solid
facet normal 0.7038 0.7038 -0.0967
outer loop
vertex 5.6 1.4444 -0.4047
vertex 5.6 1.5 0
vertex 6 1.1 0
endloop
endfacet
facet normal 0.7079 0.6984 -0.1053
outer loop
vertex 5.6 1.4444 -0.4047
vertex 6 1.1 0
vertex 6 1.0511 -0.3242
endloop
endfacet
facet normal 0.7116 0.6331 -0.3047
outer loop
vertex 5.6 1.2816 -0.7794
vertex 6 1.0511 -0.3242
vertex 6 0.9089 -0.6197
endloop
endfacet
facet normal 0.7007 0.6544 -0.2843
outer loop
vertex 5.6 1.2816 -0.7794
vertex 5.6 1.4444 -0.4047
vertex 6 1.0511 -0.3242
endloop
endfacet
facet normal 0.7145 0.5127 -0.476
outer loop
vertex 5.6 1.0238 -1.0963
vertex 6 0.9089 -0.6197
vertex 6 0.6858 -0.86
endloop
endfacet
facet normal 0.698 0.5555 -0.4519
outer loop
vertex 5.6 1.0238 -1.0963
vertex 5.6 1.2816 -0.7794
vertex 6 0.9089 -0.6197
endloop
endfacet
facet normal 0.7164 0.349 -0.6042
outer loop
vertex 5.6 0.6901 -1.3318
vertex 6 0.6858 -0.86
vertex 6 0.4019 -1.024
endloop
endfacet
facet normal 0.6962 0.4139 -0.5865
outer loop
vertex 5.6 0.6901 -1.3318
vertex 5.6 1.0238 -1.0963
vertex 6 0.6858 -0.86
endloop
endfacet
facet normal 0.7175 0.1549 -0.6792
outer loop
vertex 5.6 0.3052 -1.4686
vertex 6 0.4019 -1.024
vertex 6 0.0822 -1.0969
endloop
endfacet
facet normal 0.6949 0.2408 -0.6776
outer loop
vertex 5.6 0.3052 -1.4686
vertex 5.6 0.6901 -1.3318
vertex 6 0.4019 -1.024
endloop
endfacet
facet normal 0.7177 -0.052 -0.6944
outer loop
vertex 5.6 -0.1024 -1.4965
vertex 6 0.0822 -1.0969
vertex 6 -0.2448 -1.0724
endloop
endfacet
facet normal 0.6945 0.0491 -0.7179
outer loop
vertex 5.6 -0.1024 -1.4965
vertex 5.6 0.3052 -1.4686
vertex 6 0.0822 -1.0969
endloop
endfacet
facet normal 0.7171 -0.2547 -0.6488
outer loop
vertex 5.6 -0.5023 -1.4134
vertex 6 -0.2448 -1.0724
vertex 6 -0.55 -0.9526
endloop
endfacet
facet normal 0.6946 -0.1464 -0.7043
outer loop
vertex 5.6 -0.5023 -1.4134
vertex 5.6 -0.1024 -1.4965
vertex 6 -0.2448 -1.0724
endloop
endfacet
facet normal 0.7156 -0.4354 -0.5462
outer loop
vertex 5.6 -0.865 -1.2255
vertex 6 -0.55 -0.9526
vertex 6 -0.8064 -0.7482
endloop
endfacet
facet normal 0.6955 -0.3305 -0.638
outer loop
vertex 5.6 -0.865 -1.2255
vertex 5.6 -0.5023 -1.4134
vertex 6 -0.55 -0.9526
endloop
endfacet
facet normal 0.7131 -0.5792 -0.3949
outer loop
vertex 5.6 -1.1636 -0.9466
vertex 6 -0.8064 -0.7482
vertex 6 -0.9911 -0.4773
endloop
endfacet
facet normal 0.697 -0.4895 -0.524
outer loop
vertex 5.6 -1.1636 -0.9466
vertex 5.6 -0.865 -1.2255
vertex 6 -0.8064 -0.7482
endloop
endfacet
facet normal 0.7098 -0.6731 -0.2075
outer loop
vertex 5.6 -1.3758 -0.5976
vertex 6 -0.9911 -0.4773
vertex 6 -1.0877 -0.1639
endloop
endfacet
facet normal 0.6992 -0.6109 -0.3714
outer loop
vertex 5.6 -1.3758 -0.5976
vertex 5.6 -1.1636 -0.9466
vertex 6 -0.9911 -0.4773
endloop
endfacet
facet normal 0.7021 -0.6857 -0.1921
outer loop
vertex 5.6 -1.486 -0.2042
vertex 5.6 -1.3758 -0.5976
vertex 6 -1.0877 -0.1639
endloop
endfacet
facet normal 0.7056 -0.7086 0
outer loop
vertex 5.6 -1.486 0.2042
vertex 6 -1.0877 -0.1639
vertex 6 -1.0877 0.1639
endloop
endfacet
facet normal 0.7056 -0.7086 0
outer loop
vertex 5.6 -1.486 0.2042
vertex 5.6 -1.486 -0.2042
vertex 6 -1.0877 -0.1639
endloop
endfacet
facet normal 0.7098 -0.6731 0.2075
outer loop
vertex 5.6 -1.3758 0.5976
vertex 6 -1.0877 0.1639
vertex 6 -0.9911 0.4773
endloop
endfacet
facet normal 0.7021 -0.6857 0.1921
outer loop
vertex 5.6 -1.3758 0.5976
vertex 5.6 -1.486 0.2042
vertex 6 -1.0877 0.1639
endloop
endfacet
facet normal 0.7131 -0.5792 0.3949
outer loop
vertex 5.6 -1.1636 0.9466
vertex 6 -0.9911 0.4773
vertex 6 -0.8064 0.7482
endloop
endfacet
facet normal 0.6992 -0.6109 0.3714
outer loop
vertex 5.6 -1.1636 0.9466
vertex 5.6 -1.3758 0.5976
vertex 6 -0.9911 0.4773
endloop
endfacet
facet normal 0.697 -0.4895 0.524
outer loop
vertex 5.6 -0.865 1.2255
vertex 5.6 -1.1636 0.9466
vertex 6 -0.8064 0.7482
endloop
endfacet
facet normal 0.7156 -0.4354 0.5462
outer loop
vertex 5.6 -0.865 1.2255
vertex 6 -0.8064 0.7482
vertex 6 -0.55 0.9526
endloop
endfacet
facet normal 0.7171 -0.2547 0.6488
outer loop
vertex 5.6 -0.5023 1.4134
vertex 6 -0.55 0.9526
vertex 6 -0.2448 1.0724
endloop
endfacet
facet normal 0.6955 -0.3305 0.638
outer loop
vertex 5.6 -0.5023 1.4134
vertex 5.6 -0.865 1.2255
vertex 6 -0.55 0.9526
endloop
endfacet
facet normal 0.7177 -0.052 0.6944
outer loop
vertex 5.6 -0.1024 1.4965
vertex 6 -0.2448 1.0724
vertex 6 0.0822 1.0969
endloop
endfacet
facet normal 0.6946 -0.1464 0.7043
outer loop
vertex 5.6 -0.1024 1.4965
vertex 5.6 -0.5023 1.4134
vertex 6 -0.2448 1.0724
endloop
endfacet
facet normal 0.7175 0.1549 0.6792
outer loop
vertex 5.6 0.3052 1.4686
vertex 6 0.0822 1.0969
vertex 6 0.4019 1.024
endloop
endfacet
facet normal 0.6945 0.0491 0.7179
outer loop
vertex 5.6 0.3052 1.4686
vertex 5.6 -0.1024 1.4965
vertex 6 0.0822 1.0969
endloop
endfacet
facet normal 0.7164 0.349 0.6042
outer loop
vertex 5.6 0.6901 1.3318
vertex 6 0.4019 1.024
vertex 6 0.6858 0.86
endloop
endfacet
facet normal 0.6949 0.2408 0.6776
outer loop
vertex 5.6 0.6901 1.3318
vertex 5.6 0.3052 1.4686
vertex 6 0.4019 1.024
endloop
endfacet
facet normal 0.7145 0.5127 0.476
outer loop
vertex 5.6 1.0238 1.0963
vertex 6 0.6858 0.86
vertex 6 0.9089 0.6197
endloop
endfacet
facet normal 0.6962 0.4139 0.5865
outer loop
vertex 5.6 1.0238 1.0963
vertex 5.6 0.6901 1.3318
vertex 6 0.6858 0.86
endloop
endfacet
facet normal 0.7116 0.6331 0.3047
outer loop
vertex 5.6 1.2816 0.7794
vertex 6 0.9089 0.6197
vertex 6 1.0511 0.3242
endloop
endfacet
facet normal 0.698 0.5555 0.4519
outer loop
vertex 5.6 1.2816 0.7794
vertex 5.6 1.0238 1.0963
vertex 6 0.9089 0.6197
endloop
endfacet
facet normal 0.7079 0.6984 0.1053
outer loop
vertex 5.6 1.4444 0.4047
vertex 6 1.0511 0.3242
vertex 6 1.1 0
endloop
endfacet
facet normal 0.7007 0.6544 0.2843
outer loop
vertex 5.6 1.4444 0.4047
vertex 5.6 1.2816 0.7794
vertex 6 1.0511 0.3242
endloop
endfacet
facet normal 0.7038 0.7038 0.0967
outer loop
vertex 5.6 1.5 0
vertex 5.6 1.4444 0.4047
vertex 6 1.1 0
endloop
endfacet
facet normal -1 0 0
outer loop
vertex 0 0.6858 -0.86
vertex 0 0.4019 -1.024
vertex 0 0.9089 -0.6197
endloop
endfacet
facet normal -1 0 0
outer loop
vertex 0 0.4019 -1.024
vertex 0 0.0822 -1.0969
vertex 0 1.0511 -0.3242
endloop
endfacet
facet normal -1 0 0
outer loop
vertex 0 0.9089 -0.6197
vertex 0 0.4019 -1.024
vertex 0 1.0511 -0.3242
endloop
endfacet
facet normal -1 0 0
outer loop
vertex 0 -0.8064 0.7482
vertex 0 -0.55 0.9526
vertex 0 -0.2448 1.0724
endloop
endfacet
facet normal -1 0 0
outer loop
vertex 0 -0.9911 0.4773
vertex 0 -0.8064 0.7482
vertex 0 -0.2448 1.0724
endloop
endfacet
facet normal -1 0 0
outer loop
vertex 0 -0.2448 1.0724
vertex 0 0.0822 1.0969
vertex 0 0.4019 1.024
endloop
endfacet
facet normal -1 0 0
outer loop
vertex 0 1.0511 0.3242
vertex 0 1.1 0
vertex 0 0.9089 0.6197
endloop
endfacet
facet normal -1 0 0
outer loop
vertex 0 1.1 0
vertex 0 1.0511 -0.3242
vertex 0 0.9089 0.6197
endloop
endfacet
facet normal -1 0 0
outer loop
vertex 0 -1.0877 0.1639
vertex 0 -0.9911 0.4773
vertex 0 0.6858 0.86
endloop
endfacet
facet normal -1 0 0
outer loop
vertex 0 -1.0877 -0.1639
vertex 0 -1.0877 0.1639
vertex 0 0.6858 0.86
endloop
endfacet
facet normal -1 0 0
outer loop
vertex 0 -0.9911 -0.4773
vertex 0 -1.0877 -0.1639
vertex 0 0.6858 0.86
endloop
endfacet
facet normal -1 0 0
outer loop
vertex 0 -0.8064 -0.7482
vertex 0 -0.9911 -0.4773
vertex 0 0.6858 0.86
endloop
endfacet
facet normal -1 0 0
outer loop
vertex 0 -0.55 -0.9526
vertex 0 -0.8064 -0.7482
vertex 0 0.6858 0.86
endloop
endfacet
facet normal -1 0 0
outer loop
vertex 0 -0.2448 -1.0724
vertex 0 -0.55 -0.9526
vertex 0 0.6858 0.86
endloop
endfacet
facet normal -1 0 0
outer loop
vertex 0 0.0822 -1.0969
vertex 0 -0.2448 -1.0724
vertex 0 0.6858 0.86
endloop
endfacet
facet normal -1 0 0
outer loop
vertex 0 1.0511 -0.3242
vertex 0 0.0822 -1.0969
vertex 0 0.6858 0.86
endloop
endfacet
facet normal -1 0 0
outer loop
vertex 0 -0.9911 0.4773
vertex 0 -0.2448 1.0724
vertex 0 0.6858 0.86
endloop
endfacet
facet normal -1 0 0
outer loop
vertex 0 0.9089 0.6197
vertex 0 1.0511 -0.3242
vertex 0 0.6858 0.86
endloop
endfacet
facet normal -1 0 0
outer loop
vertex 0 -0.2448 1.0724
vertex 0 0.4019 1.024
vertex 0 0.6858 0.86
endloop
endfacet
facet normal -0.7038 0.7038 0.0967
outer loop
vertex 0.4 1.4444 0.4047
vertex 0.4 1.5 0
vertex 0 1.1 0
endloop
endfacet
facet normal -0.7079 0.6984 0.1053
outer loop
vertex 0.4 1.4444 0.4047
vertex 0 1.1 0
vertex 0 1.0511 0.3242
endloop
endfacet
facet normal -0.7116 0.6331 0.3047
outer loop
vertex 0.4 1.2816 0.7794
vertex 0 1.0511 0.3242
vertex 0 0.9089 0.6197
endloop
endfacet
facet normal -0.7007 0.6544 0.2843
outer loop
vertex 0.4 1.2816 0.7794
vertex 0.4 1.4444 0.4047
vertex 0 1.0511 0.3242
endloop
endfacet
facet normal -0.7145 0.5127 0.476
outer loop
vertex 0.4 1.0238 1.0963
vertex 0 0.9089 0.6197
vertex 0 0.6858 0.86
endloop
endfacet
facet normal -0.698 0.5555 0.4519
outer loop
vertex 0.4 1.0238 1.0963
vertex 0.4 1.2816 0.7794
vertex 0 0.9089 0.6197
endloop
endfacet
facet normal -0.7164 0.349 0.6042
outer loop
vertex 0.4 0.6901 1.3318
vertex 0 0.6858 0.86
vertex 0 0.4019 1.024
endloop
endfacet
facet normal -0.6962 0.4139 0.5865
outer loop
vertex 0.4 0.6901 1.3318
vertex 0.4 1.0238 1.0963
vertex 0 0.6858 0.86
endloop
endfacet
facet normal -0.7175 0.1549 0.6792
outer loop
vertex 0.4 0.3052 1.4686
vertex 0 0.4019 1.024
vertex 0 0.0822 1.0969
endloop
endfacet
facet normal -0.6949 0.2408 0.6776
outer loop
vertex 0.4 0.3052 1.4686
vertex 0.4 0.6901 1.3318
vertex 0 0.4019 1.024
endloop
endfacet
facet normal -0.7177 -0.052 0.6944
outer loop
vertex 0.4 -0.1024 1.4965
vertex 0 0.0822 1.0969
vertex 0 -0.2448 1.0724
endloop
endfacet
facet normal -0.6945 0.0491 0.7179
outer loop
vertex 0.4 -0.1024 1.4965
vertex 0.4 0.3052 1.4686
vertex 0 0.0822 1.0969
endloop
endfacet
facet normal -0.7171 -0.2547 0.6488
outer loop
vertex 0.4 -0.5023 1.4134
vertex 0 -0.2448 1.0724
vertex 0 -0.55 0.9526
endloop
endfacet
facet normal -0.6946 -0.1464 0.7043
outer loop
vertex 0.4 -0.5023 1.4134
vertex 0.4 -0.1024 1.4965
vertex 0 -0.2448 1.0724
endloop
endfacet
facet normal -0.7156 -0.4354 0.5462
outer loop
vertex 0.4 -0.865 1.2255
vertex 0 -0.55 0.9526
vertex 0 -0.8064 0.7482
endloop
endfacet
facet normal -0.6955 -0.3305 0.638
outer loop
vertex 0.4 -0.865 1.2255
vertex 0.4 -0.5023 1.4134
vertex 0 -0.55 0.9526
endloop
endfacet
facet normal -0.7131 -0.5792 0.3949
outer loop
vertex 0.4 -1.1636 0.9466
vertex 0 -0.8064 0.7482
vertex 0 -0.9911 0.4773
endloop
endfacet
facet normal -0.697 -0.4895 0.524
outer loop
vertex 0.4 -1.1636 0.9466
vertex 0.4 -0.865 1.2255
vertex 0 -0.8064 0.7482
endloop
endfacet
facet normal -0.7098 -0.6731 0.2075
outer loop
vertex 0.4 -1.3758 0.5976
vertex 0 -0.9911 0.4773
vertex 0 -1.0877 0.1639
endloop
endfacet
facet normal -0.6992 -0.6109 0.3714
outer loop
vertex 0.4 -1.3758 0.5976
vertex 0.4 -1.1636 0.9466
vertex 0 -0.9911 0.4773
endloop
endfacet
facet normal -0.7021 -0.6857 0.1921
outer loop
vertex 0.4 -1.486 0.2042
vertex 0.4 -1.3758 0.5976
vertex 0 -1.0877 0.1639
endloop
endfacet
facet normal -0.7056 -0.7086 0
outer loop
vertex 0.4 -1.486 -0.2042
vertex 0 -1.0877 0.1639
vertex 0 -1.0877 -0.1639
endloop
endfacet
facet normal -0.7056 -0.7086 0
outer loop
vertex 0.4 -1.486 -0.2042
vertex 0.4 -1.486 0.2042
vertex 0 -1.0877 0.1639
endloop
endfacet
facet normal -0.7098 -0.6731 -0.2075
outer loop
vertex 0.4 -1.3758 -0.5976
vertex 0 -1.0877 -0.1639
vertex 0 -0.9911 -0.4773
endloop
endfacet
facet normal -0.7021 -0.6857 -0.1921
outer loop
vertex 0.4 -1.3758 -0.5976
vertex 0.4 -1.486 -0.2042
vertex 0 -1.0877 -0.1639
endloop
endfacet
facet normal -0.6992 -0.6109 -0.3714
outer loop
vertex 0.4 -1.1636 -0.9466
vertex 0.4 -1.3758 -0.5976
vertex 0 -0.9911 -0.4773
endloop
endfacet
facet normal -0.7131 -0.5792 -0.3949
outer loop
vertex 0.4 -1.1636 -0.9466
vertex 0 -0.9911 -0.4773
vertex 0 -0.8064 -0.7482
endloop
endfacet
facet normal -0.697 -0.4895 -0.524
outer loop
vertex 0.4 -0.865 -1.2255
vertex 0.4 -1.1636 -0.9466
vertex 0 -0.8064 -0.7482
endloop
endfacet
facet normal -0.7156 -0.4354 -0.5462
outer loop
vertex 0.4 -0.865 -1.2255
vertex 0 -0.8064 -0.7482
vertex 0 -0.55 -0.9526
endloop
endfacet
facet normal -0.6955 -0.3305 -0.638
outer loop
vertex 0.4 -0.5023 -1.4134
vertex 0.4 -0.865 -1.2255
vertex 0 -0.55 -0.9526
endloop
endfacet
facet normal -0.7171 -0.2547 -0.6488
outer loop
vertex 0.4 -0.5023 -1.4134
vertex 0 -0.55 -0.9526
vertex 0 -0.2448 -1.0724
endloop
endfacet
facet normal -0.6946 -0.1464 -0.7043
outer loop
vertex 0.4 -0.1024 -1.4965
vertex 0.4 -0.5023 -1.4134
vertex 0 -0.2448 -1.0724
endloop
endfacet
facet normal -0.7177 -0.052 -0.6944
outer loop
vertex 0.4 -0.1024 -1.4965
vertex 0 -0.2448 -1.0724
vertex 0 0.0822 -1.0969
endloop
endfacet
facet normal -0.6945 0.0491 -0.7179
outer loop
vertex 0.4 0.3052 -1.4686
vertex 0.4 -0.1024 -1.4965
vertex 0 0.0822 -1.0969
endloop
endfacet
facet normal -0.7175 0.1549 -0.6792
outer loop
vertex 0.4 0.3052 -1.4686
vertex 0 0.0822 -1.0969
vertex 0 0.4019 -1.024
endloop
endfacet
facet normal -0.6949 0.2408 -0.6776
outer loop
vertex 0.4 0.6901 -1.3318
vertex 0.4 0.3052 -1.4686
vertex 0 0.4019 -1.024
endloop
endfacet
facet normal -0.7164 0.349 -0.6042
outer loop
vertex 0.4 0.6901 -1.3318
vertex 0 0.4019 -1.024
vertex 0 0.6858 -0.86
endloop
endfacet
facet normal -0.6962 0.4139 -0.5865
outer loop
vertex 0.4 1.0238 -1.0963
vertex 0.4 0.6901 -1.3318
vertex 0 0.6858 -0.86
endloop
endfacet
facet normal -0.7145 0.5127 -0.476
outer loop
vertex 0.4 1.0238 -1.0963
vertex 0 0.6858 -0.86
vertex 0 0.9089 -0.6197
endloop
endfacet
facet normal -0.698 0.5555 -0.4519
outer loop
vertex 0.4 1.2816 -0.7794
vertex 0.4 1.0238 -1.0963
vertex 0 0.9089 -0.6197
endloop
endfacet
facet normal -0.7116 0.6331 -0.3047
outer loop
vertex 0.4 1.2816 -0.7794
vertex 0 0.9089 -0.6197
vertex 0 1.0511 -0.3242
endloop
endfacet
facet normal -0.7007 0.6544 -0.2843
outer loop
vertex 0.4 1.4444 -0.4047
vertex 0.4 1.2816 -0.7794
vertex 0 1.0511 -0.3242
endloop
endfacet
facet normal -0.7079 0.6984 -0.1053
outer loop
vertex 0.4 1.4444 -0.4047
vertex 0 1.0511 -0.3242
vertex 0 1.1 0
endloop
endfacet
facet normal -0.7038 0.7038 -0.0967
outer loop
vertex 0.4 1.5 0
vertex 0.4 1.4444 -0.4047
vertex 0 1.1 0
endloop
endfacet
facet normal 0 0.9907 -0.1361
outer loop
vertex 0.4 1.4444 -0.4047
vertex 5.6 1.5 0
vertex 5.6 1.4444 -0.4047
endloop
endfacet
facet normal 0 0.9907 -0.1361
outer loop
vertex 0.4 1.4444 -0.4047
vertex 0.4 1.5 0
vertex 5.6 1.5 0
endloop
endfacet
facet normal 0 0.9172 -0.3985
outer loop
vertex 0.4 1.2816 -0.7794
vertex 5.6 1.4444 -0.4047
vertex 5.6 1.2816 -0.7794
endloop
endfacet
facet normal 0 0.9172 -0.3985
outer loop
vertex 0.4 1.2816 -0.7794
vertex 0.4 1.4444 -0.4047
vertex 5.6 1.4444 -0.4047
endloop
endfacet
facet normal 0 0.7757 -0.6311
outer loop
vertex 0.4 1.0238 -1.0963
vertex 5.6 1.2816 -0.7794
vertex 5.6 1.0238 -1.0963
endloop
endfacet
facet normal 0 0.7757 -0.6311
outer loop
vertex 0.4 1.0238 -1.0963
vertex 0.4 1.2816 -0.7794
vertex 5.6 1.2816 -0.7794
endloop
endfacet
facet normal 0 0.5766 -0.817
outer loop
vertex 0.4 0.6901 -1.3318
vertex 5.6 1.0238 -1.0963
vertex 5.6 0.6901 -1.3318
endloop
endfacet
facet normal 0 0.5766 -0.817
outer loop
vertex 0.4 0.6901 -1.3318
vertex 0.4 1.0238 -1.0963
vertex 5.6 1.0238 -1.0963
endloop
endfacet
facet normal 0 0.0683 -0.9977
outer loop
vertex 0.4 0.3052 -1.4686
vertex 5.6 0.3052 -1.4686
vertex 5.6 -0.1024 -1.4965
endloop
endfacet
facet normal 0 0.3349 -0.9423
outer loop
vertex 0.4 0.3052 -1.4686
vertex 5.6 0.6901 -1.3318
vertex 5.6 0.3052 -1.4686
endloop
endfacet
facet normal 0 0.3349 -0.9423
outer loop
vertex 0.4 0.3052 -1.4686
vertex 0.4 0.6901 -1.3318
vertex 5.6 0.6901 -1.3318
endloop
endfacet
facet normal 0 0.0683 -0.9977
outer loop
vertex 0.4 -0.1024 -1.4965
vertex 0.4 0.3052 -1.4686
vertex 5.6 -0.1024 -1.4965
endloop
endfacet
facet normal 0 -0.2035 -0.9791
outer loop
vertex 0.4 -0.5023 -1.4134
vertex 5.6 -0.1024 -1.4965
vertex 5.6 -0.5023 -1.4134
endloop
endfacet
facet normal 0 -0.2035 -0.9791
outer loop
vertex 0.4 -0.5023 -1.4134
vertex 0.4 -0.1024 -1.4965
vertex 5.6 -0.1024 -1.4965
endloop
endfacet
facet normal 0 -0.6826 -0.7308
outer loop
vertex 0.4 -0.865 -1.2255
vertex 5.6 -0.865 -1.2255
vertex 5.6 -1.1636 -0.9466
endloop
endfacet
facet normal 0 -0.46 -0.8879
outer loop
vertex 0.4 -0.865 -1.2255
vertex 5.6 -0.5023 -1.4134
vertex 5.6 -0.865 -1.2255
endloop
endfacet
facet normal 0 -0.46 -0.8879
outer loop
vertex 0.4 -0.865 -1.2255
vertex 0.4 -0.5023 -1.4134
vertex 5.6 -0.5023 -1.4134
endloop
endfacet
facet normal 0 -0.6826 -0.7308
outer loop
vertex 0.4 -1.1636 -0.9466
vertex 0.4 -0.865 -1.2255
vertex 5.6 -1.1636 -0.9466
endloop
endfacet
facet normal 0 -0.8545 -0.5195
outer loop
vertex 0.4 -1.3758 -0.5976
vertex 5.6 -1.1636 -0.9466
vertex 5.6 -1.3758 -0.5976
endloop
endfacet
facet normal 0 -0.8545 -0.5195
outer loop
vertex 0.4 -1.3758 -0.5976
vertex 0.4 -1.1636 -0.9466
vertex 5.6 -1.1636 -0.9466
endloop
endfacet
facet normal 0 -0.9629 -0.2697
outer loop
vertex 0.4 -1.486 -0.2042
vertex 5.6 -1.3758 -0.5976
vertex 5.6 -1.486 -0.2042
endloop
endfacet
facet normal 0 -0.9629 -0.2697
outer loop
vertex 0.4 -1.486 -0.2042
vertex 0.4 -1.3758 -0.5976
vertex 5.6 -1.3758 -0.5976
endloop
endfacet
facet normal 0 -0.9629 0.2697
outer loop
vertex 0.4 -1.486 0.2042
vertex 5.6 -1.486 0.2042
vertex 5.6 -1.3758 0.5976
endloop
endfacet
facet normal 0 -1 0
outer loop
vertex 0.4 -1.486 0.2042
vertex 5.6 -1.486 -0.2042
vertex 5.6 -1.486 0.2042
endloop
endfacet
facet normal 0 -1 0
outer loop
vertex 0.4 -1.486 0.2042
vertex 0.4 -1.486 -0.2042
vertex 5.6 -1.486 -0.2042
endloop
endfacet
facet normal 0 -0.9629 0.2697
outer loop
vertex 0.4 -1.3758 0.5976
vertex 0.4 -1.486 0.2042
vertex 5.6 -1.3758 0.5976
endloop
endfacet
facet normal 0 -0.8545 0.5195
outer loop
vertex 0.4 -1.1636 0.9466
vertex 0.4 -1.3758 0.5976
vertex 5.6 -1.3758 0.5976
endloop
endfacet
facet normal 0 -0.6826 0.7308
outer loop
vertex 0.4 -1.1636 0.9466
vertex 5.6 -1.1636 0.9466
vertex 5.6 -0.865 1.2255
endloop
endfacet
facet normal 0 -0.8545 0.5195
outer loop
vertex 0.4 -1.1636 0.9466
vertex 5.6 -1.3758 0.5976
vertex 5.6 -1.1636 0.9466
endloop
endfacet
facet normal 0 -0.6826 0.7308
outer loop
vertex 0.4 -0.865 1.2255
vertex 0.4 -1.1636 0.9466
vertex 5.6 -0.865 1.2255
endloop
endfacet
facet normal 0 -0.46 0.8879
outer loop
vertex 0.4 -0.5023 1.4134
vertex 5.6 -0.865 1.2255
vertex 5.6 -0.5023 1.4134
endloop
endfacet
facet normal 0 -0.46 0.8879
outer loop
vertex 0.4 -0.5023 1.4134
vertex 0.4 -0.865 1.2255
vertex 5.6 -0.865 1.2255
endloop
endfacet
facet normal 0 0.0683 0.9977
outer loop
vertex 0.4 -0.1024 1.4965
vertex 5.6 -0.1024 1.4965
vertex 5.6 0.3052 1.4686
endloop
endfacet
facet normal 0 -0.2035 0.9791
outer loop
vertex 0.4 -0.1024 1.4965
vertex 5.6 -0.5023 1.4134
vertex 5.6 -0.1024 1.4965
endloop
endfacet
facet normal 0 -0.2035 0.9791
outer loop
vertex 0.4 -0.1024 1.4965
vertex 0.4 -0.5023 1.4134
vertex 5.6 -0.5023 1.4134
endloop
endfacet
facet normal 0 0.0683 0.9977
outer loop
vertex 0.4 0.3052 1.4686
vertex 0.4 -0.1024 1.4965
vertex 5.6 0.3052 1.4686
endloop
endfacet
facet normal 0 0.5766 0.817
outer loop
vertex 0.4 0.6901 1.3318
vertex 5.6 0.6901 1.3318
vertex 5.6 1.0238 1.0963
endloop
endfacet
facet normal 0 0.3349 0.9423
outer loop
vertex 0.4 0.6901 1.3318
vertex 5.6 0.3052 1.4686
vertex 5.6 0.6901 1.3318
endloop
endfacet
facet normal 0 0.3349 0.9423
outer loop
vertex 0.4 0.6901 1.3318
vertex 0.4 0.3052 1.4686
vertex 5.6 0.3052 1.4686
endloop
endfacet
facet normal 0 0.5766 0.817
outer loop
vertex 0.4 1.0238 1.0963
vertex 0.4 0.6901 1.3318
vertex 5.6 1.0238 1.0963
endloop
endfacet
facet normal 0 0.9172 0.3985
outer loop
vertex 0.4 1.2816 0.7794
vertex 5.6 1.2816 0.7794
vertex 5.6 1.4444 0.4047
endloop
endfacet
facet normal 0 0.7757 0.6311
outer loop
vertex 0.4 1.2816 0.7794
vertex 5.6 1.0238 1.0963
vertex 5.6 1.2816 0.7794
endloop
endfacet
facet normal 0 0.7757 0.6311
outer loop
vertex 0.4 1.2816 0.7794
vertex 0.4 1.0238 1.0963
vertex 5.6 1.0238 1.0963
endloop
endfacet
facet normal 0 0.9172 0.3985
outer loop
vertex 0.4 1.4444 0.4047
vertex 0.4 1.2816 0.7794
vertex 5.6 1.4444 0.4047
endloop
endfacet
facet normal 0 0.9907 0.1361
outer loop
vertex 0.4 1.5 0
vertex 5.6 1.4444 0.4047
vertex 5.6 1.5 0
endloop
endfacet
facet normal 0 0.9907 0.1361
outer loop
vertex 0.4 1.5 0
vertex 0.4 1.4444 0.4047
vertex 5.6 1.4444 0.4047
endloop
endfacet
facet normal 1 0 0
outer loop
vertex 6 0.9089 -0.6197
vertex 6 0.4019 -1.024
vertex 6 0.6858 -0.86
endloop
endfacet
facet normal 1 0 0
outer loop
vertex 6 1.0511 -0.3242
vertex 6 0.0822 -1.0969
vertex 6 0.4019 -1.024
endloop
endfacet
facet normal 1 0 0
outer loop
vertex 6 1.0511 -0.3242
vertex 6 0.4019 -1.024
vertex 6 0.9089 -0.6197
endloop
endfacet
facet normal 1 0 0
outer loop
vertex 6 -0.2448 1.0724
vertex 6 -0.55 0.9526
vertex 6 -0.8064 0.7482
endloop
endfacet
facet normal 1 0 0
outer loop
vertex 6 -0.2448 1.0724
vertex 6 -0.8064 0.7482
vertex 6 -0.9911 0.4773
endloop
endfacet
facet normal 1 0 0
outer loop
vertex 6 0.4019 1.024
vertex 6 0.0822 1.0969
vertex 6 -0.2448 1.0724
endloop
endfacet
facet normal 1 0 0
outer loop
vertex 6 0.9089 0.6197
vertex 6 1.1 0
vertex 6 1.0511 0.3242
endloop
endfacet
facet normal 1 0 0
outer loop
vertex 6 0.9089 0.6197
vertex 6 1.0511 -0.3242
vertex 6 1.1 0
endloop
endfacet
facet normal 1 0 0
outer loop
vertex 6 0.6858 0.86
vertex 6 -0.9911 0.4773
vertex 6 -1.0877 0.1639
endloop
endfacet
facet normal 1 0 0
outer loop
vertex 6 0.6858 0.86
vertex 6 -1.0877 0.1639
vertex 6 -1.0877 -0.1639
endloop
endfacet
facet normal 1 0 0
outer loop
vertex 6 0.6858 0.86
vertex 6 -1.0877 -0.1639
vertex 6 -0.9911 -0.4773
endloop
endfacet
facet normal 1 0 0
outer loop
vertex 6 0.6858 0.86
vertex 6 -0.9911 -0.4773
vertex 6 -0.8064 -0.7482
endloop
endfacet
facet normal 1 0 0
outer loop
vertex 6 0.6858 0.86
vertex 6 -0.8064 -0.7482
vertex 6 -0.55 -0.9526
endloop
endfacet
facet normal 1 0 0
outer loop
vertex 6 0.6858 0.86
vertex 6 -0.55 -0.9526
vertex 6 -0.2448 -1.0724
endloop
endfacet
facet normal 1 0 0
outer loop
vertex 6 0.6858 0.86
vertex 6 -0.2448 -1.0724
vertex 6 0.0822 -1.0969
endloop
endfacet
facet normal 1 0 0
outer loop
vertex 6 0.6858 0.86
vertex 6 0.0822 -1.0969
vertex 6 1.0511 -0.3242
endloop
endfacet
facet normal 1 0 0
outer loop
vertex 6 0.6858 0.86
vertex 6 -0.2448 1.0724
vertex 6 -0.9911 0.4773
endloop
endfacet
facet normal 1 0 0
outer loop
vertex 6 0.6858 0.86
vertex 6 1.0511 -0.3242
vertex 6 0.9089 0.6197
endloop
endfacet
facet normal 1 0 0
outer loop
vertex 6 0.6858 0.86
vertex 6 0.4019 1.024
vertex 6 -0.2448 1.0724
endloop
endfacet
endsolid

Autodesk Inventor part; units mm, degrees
ref_plane "YZ Plane" through (0, 0, 0) normal (1, 0, 0) x (0, 1, 0)
ref_plane "XZ Plane" through (0, 0, 0) normal (0, 1, 0) x (-1, 0, 0)
ref_plane "XY Plane" through (0, 0, 0) normal (0, 0, 1) x (1, 0, 0)
sketch "Skizze" plane through (0, 0, 0) normal (1, 0, 0) x (0, 1, 0)
  circle A0 centre (0, 0) radius 1.5
  dimension "d1" = 3
extrude "Körper" add sketch "Skizze" along normal blind 6
chamfer "Fase1" distance 0.4 angle 45 1 edges at (0, -1.5, 0) measured on face at (4, 1.4806, -0.2406)
chamfer "Skizze2" distance 0.4 angle 45 1 edges at (6, -1.5, 0) measured on face at (4.1333, 1.4951, -0.1207)
equation "\"d1\" = NND"
equation "\"d2\" = NLG"
equation "\"d4\" = PHH"
equation "\"d5\" = FAWI"
equation "\"d11\" = PHH"
equation "\"d8\" = PHH"
equation "\"d9\" = FAWI"
equation "\"d12\" = PHH"
equation "\"NND\" = 3"
equation "\"NLG\" = 6"
equation "\"PHH\" = 0.4"
equation "\"FAWI\" = 45deg"
equation "\"KAH\" = 0.3"
equation "\"NLG1\" = 6.8"
properties part number "CNS 397 - 3 x 6" material "Stahl, weich"
